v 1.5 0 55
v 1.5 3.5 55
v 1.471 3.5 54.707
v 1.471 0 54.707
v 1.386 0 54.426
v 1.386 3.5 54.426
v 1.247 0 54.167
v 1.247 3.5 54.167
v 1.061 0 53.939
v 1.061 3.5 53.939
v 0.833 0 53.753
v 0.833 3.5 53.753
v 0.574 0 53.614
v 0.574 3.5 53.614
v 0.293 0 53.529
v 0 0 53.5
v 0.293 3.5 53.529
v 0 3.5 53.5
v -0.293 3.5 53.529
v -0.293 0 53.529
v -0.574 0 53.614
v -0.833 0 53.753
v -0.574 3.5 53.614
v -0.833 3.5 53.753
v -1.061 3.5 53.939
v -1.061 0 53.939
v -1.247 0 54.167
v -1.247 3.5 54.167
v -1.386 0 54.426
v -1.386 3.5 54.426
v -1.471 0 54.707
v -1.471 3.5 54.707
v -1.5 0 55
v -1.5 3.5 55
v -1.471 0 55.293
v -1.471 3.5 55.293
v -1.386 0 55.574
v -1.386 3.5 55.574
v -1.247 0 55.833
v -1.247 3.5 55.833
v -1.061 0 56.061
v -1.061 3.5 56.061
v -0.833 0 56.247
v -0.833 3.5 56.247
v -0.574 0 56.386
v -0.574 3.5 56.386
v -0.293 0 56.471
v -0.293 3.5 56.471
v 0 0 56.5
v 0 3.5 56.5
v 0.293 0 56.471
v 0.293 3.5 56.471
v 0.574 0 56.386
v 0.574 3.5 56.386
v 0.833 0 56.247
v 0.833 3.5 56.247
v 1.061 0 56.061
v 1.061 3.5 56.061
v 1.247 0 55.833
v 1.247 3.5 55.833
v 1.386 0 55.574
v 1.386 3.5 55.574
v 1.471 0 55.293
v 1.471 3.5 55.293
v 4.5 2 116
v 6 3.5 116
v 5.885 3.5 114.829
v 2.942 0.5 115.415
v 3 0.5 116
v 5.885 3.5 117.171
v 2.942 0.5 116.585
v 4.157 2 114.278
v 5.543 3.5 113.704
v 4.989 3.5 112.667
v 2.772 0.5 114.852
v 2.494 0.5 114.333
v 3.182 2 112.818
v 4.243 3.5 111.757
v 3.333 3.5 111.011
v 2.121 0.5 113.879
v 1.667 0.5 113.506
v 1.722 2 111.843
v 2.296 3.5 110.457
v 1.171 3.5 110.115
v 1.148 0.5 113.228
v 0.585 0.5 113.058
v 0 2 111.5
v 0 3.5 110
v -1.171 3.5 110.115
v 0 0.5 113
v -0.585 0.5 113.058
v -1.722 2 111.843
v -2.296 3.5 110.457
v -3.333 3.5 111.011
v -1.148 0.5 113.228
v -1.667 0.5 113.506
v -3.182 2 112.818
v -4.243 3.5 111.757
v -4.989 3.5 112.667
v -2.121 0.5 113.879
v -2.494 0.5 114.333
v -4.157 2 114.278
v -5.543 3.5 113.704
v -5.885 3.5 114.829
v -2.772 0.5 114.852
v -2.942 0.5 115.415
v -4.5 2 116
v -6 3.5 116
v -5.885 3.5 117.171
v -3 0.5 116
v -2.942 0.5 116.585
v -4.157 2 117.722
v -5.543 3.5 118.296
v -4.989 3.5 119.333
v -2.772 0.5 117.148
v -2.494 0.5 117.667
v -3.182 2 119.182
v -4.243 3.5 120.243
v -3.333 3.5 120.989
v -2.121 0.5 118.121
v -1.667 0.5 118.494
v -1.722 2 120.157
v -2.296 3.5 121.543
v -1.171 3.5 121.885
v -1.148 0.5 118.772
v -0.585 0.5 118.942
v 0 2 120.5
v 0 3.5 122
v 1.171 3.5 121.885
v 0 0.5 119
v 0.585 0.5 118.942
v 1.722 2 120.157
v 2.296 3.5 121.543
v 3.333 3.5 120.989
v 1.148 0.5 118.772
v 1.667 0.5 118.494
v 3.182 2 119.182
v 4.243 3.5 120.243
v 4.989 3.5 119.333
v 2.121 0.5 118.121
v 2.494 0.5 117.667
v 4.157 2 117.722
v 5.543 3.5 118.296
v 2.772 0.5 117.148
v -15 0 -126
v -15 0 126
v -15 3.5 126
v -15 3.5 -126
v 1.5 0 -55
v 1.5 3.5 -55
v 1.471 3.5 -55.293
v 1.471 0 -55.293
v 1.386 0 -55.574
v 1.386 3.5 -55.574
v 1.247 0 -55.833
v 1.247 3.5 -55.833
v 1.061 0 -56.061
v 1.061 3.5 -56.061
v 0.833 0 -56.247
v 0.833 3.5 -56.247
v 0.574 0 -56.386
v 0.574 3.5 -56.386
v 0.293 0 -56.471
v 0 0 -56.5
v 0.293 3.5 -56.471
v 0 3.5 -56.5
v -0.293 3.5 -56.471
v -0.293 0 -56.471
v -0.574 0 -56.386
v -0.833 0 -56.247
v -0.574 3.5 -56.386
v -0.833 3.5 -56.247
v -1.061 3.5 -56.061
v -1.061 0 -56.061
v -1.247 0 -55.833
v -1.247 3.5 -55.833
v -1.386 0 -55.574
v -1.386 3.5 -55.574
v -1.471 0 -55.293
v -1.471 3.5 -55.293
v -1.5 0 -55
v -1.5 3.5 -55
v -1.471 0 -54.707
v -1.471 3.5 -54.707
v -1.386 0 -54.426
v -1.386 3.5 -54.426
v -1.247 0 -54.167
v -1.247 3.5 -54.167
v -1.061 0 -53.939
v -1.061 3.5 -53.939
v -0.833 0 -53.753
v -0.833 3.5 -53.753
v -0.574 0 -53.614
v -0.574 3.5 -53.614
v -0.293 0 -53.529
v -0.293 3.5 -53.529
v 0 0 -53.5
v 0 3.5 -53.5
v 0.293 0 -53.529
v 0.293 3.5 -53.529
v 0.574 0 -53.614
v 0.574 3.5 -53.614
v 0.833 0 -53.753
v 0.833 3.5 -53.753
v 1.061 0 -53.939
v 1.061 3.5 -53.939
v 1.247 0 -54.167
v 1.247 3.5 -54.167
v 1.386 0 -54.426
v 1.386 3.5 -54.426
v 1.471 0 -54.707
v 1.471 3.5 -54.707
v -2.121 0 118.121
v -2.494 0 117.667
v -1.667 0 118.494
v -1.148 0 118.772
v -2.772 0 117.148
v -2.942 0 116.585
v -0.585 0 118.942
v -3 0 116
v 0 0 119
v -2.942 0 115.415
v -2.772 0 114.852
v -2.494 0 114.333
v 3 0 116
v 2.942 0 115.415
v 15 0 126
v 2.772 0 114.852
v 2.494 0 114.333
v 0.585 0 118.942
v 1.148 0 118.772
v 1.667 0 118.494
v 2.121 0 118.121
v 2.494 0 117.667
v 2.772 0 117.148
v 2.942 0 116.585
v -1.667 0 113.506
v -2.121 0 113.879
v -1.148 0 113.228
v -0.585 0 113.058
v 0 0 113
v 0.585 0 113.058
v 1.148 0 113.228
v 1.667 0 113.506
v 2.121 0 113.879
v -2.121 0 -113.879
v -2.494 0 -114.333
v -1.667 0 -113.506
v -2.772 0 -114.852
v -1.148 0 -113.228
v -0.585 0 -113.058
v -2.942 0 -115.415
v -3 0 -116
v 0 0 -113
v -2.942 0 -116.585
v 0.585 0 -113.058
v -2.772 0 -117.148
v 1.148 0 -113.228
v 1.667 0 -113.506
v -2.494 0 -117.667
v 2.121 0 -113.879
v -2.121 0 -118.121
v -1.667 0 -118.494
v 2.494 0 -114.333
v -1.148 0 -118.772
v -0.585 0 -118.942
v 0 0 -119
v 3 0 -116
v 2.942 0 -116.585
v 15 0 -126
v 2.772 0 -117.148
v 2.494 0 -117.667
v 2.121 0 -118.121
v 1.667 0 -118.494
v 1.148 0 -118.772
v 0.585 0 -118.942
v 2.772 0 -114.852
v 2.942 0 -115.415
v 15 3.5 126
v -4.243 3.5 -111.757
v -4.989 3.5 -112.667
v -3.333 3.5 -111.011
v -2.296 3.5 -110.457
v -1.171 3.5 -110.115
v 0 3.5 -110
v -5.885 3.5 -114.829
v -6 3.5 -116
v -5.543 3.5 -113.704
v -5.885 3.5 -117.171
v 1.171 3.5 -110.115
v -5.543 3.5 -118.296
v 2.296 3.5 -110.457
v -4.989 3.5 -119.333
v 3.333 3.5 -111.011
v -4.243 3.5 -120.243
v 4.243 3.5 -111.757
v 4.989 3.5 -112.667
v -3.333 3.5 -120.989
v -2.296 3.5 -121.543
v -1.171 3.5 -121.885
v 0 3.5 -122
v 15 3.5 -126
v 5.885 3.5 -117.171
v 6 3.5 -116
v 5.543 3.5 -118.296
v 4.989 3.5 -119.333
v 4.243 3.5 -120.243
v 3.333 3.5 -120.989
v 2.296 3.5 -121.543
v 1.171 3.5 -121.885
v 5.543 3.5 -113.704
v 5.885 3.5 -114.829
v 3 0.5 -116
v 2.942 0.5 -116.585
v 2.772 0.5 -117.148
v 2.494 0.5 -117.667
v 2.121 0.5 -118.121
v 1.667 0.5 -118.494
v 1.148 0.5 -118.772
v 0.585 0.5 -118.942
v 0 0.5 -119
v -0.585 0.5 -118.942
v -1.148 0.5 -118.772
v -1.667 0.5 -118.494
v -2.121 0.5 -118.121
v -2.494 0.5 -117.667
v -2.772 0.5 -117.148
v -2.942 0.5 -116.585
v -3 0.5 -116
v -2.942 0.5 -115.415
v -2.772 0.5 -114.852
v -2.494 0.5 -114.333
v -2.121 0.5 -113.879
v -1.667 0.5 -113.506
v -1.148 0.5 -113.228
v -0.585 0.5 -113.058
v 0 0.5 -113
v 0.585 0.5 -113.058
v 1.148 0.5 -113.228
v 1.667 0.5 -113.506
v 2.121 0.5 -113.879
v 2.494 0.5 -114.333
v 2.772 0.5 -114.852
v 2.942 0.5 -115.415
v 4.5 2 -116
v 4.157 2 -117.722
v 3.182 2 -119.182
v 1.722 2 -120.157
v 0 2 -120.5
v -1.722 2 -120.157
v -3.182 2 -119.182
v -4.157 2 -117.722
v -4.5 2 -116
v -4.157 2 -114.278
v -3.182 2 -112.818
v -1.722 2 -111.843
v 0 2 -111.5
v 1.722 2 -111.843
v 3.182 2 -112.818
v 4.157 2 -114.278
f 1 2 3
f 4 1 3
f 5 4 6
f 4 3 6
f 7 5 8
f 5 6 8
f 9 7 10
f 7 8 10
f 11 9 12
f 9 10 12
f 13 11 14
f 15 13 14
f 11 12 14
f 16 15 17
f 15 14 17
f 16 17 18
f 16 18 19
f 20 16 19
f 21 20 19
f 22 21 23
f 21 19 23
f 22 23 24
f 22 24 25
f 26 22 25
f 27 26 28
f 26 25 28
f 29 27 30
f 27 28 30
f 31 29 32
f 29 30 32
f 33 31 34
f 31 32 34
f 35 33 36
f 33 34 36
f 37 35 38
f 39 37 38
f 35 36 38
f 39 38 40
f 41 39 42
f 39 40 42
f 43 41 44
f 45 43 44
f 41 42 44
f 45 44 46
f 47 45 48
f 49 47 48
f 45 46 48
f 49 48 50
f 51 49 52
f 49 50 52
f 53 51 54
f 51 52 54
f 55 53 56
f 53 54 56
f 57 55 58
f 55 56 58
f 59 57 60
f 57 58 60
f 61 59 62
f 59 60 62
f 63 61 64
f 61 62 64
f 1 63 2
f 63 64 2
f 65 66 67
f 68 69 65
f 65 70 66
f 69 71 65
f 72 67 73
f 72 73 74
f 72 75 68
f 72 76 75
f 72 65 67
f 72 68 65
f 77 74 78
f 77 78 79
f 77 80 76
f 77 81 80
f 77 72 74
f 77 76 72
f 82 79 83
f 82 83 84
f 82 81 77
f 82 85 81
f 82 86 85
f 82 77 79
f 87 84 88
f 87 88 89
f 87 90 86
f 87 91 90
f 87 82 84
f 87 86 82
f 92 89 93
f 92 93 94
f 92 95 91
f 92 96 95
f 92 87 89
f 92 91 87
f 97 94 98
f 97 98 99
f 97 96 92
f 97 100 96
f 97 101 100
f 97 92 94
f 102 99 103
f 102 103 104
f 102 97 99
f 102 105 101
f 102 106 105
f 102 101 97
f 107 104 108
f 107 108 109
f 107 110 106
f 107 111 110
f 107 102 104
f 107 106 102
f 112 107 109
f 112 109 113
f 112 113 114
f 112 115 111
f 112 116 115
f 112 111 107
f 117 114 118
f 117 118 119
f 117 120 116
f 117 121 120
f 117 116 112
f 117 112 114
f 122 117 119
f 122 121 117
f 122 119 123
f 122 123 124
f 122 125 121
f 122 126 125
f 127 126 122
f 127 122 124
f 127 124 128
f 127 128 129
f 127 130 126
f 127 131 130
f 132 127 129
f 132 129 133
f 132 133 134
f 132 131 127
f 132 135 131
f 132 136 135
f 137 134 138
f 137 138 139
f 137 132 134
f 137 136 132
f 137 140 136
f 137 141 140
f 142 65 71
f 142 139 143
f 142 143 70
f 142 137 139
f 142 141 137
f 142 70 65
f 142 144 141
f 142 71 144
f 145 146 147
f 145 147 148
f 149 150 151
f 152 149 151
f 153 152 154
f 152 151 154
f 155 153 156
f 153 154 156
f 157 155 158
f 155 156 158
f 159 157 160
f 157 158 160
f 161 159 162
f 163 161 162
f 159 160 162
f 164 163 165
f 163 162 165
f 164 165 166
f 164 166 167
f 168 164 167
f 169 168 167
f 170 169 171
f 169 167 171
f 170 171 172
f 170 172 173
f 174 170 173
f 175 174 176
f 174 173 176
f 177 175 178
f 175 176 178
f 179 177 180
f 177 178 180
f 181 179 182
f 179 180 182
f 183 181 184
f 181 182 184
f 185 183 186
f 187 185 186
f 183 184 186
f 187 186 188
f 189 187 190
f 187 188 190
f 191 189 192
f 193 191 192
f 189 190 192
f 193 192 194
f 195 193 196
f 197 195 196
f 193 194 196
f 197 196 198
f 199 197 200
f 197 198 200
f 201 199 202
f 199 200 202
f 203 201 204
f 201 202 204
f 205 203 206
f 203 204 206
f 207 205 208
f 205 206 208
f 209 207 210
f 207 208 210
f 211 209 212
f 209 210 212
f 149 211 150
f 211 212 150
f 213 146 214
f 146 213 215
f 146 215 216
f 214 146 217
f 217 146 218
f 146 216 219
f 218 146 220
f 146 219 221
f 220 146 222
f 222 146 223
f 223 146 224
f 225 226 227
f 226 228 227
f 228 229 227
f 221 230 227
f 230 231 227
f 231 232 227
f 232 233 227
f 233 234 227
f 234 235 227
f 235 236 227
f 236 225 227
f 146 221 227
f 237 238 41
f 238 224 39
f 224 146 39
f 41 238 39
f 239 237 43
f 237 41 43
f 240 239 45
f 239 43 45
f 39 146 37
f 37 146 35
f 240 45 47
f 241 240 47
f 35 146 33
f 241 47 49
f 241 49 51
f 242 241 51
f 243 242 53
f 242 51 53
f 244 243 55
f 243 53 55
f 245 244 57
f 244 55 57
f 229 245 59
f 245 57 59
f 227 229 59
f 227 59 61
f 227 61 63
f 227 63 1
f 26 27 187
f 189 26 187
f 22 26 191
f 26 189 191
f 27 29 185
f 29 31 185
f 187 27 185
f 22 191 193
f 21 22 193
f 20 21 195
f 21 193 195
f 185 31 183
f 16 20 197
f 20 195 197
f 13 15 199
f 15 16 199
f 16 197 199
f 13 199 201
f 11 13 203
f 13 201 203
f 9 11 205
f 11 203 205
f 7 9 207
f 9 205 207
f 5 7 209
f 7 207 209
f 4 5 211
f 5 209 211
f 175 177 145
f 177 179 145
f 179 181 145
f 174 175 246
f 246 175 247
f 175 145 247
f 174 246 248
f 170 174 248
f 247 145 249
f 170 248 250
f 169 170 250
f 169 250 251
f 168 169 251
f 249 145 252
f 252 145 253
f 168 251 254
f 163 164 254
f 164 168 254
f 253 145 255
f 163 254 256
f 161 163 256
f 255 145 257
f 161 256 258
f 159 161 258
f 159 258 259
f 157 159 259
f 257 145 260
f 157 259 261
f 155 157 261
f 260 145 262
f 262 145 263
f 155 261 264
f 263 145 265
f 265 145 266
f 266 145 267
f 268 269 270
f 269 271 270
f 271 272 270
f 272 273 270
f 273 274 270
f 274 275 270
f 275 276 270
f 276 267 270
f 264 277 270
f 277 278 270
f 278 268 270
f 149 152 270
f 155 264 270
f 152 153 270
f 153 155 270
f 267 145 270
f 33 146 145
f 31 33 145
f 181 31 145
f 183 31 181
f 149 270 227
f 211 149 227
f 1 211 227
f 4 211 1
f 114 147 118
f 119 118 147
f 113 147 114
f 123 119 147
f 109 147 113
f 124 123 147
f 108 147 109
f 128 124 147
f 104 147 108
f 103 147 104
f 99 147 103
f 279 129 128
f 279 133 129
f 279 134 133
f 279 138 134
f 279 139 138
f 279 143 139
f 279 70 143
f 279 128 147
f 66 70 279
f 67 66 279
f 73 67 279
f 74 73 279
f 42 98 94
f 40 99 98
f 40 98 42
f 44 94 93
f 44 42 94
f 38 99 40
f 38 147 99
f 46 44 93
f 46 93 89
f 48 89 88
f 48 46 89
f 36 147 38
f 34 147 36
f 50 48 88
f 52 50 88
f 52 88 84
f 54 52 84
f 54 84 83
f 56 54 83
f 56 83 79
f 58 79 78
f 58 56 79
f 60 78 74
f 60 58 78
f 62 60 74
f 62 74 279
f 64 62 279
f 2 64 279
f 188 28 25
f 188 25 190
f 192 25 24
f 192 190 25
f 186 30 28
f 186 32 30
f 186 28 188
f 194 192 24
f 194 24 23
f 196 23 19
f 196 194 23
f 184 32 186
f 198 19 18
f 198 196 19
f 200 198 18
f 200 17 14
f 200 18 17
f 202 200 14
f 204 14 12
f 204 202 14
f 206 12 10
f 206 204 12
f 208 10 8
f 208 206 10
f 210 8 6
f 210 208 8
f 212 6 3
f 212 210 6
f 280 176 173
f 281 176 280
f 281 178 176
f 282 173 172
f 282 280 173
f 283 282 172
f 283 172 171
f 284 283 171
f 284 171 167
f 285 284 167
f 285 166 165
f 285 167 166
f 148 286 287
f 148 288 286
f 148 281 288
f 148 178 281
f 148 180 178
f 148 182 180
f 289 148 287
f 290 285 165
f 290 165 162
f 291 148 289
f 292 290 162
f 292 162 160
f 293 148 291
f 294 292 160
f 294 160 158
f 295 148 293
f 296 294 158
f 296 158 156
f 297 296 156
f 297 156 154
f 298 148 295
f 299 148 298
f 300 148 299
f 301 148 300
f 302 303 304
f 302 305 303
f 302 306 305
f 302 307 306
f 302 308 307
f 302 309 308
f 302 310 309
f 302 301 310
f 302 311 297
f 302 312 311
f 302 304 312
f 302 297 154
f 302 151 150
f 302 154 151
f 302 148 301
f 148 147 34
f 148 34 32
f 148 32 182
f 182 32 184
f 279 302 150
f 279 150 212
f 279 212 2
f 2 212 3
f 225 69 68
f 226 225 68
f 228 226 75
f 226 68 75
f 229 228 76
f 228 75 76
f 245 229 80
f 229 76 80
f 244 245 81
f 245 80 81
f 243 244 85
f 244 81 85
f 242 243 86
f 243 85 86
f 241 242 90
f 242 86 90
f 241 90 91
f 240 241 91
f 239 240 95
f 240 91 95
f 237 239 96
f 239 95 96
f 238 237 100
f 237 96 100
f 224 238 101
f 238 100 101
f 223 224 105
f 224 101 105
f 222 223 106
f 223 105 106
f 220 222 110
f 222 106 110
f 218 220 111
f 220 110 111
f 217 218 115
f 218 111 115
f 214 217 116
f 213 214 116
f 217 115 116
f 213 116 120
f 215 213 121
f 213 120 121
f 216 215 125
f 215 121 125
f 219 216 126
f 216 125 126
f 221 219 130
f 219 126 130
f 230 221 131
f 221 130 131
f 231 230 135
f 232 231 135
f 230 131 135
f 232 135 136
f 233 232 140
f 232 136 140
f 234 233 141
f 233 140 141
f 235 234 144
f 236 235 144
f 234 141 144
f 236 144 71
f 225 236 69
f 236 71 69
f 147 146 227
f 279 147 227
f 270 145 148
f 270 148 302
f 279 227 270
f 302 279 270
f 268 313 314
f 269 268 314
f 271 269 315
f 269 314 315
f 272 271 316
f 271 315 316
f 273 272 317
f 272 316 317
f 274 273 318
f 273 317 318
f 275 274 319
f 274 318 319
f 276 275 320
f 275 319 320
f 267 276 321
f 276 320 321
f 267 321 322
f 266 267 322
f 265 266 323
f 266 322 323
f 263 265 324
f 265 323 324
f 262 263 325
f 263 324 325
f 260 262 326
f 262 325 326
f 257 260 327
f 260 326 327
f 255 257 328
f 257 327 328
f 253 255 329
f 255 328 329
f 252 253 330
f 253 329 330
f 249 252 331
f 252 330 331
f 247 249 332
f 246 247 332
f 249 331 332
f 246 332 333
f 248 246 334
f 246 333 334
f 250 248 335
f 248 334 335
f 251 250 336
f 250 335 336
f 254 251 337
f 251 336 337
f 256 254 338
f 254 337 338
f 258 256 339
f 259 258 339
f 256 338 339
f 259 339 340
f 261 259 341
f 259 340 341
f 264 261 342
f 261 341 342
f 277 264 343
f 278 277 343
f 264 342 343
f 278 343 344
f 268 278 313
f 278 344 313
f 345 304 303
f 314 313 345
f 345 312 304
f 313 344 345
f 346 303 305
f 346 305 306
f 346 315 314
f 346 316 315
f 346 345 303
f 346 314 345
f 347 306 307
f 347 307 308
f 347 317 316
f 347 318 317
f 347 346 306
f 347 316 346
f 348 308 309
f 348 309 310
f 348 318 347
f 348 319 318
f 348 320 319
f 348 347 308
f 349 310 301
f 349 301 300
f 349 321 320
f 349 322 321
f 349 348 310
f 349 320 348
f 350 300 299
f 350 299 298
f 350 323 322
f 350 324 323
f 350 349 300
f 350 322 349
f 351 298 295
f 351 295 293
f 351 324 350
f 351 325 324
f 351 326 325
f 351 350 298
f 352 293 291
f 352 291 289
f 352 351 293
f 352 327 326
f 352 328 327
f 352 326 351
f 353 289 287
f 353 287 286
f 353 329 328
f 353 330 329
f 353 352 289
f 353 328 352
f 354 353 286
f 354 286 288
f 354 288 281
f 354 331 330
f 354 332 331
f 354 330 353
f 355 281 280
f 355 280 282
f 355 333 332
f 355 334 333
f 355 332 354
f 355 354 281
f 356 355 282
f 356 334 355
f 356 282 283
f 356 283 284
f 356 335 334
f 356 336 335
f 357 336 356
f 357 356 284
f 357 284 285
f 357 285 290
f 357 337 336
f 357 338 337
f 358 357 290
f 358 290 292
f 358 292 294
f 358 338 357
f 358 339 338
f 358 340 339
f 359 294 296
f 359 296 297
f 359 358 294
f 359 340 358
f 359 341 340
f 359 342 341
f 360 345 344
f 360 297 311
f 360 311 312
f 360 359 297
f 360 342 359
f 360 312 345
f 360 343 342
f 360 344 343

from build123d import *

# Parameters (mm, degrees)
SKETCH1_W           = 30
SKETCH1_H           = 252
BOSS_EXTRUDE1_DEPTH = 3.5
SKETCH2_R           = 1.5
SKETCH2_R_2         = 3
CUT_EXTRUDE1_DEPTH  = 3.5
CHAMFER1_SIZE       = 3


with BuildPart() as part:
    # Sketch1 → Boss-Extrude1 (new body)
    with BuildSketch(Plane(origin=(0, 0, 0), x_dir=(1, 0, 0), z_dir=(0, 1, 0))):
        Rectangle(SKETCH1_W, SKETCH1_H)
    extrude(amount=BOSS_EXTRUDE1_DEPTH)

    # Sketch2 → Cut-Extrude1 (cut)
    with BuildSketch(Plane(origin=(0, 3.5, 0), x_dir=(1, 0, 0), z_dir=(0, 1, 0))):
        with Locations((0, 55)):
            Circle(SKETCH2_R)
        with Locations((0, -55)):
            Circle(SKETCH2_R)
        with Locations((0, 116)):
            Circle(SKETCH2_R_2)
        with Locations((0, -116)):
            Circle(SKETCH2_R_2)
    extrude(amount=-CUT_EXTRUDE1_DEPTH, mode=Mode.SUBTRACT)

    # Chamfer1
    chamfer1_edges = [part.edges().sort_by_distance(p)[0] for p in [
        (-3, 3.5, 116),
        (-3, 3.5, -116),
    ]]
    chamfer(chamfer1_edges, length=CHAMFER1_SIZE)


solid = part.part
